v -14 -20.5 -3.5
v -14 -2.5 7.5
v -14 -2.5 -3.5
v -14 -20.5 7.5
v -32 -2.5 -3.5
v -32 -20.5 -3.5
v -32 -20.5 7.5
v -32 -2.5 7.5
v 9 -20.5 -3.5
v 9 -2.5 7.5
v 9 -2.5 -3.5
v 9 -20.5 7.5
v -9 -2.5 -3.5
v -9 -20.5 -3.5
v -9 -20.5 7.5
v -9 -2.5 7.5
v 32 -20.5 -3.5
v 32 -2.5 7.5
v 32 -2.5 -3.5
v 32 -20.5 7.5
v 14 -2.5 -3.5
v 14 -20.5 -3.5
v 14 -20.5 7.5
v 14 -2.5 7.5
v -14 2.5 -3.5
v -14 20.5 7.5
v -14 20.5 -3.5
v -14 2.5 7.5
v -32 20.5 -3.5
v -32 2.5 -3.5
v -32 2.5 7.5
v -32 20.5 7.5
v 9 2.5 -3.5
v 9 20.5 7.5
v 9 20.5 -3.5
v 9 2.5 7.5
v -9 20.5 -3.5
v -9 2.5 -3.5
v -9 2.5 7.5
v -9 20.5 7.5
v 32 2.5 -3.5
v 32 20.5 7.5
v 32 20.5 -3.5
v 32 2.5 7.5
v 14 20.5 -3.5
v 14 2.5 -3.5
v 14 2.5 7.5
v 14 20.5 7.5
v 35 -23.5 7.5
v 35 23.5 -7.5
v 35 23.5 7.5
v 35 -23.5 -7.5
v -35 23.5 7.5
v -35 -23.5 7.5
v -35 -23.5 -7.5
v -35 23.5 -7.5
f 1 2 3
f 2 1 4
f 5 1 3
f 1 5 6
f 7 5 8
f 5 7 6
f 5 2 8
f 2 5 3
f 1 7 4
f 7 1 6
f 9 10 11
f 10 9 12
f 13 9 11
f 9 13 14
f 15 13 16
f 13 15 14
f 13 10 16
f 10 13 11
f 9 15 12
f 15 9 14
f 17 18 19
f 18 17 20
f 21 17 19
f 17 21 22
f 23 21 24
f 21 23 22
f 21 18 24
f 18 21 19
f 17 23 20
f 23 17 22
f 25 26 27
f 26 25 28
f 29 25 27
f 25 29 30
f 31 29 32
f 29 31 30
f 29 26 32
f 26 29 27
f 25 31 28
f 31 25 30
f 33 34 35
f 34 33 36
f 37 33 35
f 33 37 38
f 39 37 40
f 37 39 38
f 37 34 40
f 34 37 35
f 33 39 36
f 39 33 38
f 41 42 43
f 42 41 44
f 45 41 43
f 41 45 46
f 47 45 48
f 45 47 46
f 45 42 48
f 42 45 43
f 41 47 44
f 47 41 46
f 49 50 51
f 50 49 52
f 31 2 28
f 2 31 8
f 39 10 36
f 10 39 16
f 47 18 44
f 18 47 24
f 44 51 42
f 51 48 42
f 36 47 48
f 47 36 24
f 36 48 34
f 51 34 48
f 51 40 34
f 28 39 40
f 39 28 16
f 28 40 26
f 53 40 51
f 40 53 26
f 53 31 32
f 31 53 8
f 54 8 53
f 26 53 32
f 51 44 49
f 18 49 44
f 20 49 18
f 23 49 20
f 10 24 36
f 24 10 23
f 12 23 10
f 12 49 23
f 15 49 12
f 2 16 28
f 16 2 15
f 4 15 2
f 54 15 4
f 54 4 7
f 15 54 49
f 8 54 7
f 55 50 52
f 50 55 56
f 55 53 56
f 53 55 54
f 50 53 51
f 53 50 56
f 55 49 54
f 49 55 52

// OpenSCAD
$fn = 32;

// ----------------------------------------------------------------------
// Pocket plate 70 x 47 x 15
// 2 x 3 pockets 18 mm square, 11 mm deep
// ----------------------------------------------------------------------

// --- parameters (mm) ---
thickness = 15;  // plate thickness
floor_t = 4;     // material left under each pocket
pocket = 18;     // pocket side length
pitch_x = 23;    // pocket pitch along X
pitch_y = 23;    // pocket pitch along Y
cols = 3;        // pockets per row
rows = 2;        // rows of pockets

// --- derived feature positions (mm) ---
depth = thickness - floor_t;        // = 11   pocket depth, down to the floor
span_x = (cols - 1) * pitch_x;      // = 46   distance between outer pockets
span_y = (rows - 1) * pitch_y;      // = 23   distance between outer pocket rows
origin_x = -span_x / 2;             // = -23   X of the first pocket
origin_y = -span_y / 2;             // = -11.5   Y of the first pocket
plate = [span_x + pocket + 6, span_y + pocket + 6, thickness];  // = [70, 47, 15]   overall size: pockets plus 3 mm of wall on each side
feature_centers = [
  [origin_x + 0 * pitch_x, origin_y + 0 * pitch_y],
  [origin_x + 1 * pitch_x, origin_y + 0 * pitch_y],
  [origin_x + 2 * pitch_x, origin_y + 0 * pitch_y],
  [origin_x + 0 * pitch_x, origin_y + 1 * pitch_y],
  [origin_x + 1 * pitch_x, origin_y + 1 * pitch_y],
  [origin_x + 2 * pitch_x, origin_y + 1 * pitch_y]
];   // pocket centres, used verbatim by the cutter loop

// plate outline, then one pocket per centre in feature_centers
difference() {
  cube(plate, center = true);
  for (centre = feature_centers)
    translate([centre[0] - pocket / 2, centre[1] - pocket / 2, plate[2] / 2 - depth])
      cube([pocket, pocket, depth + 1]);  // centred on the declared pocket centre
}
